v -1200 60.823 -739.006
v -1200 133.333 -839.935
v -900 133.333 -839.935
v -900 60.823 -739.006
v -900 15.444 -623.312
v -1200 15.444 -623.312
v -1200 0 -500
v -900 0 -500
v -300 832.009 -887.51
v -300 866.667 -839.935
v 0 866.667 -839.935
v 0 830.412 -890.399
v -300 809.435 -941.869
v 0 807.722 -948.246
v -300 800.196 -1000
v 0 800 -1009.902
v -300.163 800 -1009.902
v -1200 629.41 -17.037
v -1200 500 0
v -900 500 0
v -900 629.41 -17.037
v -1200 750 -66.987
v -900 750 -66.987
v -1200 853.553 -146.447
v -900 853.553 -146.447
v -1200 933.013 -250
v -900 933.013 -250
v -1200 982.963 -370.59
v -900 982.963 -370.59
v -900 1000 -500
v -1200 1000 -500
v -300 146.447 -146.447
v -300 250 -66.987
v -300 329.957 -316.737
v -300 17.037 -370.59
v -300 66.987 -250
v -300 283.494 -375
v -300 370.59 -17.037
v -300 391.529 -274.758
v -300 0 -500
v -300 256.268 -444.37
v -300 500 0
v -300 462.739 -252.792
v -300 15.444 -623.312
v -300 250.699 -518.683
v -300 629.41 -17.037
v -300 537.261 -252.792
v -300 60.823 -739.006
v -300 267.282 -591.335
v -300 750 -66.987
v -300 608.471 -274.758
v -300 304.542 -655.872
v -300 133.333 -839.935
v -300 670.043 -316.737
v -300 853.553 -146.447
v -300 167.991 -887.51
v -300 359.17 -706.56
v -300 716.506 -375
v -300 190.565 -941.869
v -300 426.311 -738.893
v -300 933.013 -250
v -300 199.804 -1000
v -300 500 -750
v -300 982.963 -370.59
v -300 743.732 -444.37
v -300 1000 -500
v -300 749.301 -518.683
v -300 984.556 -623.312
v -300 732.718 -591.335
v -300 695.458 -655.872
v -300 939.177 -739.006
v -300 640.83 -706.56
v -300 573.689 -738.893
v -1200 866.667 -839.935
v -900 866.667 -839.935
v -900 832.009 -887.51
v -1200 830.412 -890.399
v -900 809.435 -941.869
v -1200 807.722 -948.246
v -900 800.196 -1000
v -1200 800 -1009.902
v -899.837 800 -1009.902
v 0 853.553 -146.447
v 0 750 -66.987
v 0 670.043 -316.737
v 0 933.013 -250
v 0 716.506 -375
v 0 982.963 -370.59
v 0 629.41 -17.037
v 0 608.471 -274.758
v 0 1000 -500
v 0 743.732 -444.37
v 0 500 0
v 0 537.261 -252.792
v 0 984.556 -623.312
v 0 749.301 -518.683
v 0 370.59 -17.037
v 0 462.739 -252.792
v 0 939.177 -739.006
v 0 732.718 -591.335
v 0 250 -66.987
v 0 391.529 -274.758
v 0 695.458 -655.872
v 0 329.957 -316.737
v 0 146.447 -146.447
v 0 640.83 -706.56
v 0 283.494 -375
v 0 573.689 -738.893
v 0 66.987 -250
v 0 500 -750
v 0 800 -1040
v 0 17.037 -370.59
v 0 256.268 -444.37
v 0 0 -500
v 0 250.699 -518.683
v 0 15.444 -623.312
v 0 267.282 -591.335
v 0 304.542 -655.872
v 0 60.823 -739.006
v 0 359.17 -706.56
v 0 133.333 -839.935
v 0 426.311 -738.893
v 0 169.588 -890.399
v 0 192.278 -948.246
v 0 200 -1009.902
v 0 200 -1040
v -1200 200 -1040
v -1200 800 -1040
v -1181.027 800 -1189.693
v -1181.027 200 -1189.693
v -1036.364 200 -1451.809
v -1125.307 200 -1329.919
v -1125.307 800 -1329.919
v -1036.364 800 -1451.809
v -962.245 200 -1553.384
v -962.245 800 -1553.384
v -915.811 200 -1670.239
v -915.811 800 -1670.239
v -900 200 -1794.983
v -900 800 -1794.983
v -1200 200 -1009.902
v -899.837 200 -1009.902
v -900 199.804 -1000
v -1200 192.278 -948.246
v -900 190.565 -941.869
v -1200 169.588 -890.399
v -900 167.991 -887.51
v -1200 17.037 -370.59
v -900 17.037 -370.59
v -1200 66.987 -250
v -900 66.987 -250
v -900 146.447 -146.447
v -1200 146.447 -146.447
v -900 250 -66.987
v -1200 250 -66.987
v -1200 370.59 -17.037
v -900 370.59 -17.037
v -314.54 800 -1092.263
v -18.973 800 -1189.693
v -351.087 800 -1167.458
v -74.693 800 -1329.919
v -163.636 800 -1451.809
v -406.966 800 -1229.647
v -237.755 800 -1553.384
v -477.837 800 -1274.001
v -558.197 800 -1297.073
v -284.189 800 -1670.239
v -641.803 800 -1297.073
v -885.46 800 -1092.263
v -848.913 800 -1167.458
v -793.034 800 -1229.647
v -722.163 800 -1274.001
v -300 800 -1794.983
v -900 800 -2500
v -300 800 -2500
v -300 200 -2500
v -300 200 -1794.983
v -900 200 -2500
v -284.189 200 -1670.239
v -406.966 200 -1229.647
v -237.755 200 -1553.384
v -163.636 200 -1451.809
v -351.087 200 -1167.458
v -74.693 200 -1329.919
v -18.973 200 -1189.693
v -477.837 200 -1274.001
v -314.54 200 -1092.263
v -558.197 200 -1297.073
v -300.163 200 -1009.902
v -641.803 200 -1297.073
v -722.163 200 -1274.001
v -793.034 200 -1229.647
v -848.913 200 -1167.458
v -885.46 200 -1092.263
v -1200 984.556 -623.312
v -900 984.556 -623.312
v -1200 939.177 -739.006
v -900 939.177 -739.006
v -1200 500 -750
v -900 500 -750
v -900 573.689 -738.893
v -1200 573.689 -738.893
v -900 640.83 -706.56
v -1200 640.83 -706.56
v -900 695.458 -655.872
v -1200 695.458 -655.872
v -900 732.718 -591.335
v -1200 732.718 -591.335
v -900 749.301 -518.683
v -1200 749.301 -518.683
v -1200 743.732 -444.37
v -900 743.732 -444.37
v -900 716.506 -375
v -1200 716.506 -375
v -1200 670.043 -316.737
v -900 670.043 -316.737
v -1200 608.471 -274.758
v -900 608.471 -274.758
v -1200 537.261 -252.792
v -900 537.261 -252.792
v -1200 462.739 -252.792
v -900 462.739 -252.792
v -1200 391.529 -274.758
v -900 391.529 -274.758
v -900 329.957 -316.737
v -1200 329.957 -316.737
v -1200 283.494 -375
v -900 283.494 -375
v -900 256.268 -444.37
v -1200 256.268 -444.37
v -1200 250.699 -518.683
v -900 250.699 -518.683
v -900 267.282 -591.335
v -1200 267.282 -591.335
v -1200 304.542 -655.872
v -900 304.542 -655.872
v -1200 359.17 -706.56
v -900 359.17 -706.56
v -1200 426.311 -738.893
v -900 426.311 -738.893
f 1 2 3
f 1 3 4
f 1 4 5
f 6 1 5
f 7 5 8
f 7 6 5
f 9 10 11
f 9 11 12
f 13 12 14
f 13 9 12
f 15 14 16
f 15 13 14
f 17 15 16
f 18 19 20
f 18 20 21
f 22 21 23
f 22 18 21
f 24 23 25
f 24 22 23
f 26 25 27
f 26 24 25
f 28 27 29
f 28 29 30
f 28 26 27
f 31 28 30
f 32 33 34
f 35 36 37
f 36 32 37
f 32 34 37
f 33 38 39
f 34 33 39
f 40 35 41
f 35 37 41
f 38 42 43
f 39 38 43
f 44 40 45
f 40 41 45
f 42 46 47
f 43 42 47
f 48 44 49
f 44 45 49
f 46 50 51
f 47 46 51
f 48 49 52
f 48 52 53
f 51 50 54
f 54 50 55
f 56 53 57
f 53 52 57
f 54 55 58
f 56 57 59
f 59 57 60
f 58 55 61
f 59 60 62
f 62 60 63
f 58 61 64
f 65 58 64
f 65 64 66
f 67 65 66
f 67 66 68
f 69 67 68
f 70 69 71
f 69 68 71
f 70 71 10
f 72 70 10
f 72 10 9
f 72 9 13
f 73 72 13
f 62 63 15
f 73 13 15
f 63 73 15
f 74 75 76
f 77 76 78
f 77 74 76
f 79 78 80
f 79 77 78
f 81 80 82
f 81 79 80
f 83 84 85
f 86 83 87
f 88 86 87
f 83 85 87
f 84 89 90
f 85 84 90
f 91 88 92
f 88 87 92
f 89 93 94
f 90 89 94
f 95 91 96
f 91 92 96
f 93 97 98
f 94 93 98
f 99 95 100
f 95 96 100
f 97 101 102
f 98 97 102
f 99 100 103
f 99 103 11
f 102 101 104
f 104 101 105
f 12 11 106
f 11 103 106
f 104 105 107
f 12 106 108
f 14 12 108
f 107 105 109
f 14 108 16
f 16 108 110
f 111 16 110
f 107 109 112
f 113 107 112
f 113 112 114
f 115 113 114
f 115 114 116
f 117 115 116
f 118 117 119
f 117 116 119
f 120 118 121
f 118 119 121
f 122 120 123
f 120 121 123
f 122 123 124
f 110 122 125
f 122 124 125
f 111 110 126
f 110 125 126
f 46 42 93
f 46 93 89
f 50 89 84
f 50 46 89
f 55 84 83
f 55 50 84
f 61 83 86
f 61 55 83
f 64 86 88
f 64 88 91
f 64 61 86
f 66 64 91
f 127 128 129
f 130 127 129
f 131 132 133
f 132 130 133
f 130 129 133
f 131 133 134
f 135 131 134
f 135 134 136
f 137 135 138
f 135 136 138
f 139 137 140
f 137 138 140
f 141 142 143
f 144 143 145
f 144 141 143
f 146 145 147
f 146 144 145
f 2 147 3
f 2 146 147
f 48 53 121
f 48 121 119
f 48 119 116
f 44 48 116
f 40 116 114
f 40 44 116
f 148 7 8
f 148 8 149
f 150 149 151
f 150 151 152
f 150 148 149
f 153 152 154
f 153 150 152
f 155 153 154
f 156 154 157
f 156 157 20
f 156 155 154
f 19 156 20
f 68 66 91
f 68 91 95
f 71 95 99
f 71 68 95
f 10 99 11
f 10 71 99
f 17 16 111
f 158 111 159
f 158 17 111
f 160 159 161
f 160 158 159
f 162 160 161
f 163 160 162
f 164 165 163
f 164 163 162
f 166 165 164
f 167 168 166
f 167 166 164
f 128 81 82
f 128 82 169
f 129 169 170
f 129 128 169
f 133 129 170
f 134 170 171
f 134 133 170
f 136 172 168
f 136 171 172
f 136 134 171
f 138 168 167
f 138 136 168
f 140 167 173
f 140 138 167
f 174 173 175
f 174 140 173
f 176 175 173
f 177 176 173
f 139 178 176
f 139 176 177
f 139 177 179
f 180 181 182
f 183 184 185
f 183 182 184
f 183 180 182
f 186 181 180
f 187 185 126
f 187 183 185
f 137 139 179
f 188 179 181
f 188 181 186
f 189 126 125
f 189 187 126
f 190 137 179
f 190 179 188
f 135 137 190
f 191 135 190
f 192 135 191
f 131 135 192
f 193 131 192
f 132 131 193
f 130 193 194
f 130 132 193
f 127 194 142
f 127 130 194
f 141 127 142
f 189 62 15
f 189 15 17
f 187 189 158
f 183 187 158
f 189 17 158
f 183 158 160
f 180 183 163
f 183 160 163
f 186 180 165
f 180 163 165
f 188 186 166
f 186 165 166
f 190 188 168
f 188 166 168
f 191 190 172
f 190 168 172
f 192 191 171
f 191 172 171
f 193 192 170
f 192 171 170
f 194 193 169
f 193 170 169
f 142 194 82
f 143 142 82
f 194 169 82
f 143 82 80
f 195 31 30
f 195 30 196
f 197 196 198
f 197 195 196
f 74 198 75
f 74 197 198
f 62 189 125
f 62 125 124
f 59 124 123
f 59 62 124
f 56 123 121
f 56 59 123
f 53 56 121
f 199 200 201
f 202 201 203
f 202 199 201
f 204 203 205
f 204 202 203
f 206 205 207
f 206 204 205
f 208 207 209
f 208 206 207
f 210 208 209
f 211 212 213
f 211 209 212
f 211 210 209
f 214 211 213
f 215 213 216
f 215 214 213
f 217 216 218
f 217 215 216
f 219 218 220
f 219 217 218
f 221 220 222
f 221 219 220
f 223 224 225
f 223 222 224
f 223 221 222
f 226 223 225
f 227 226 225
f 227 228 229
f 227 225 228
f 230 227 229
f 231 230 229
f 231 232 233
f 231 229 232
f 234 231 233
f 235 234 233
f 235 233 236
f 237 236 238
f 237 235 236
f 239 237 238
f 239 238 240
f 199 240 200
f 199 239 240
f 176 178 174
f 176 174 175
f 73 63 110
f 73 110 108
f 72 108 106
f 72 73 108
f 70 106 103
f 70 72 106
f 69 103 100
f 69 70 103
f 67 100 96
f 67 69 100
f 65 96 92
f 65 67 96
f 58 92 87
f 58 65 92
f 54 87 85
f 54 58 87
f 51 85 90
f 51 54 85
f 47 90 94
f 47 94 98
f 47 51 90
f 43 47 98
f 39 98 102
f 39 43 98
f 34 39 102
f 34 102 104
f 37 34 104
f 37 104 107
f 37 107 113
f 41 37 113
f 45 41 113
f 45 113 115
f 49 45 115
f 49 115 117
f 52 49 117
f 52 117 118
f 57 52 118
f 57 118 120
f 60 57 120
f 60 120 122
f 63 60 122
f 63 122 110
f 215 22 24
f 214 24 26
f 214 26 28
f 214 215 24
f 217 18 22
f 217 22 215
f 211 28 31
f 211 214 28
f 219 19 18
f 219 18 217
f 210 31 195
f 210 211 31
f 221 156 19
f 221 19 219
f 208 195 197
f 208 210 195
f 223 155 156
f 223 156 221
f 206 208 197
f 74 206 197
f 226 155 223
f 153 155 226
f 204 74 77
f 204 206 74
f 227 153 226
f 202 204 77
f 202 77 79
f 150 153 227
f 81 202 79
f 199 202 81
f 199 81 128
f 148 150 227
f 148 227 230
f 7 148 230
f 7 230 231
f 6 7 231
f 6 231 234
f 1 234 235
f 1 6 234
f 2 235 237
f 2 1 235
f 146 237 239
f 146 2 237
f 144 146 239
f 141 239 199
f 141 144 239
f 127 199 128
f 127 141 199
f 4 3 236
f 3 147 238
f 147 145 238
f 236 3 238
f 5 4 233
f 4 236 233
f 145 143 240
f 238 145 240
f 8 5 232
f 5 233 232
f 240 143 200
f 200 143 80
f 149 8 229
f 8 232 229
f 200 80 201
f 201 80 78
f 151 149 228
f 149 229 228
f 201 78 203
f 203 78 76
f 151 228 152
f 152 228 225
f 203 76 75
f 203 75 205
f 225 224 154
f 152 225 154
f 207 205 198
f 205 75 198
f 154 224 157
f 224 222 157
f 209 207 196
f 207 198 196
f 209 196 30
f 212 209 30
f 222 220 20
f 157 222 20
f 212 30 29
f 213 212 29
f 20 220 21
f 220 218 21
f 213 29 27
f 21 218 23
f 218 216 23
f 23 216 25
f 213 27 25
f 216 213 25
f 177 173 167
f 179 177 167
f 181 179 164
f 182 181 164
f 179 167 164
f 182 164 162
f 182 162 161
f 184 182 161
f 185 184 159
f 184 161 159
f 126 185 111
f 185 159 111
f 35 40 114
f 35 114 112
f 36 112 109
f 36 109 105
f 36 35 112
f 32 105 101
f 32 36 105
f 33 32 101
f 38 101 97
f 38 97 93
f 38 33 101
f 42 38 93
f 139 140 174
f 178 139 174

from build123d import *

# Parameters (mm, degrees)
SKETCH1_W           = 1200
SKETCH1_H           = 2500
BOSS_EXTRUDE1_DEPTH = 1000
CUT_EXTRUDE1_DEPTH  = 2948.880594597
SKETCH3_R           = 250
CUT_EXTRUDE2_DEPTH  = 2948.880594597


with BuildPart() as part:
    # Sketch1 → Boss-Extrude1 (new body)
    with BuildSketch(Plane(origin=(0, 0, 0), x_dir=(1, 0, 0), z_dir=(0, 1, 0))):
        with Locations((-600, 1250)):
            Rectangle(SKETCH1_W, SKETCH1_H)
    extrude(amount=BOSS_EXTRUDE1_DEPTH)

    # Sketch2 → Cut-Extrude1 (cut, through all)
    with BuildSketch(Plane(origin=(0, 1000, 0), x_dir=(1, 0, 0), z_dir=(0, 1, 0))):
        with BuildLine():
            ThreePointArc((-300, 1000), (-600, 1300), (-900, 1000))
            Line((-900, 1000), (-900, 0))
            Line((-900, 0), (-300, 0))
            Line((-300, 0), (-300, 1000))
        make_face()
        with BuildLine():
            Line((0, 2500), (-300, 2500))
            Line((-300, 2500), (-300, 1794.983443527))
            ThreePointArc((-300, 1794.983443527), (-264.660188642, 1610.346207058), (-163.636363636, 1451.809151015))
            ThreePointArc((-163.636363636, 1451.809151015), (-42.407773629, 1261.564683763), (0, 1040))
            Line((0, 1040), (0, 2500))
        make_face()
        with BuildLine():
            Line((-900, 1794.983443527), (-900, 2500))
            Line((-900, 2500), (-1200, 2500))
            Line((-1200, 2500), (-1200, 1040))
            ThreePointArc((-1200, 1040), (-1157.592226371, 1261.564683763), (-1036.363636364, 1451.809151015))
            ThreePointArc((-1036.363636364, 1451.809151015), (-935.339811358, 1610.346207058), (-900, 1794.983443527))
        make_face()
    extrude(amount=-CUT_EXTRUDE1_DEPTH, mode=Mode.SUBTRACT)

    # Sketch3 → Cut-Extrude2 (cut, through all)
    with BuildSketch(Plane(origin=(0, 0, 0), x_dir=(0, 0, -1), z_dir=(1, 0, 0))):
        with BuildLine():
            Line((2500, 800), (2500, 1000))
            Line((2500, 1000), (499.999999194, 1000))
            ThreePointArc((499.999999194, 1000), (682.57418546, 965.474668273), (839.93463424, 866.666666667))
            ThreePointArc((839.93463424, 866.666666667), (918.614858442, 817.262665937), (1009.901951359, 800))
            Line((1009.901951359, 800), (2500, 800))
        make_face()
        with BuildLine():
            Line((2500, 0), (2500, 200))
            Line((2500, 200), (1009.901951359, 200))
            ThreePointArc((1009.901951359, 200), (918.614858442, 182.737334063), (839.93463424, 133.333333333))
            ThreePointArc((839.93463424, 133.333333333), (682.574185835, 34.525331874), (500, 0))
            Line((500, 0), (2500, 0))
        make_face()
        with BuildLine():
            ThreePointArc((0, 500.000000799), (146.446609404, 853.553390591), (499.999999194, 1000))
            Line((499.999999194, 1000), (0, 1000))
            Line((0, 1000), (0, 500.000000799))
        make_face()
        with BuildLine():
            Line((0, 0), (500, 0))
            ThreePointArc((500, 0), (146.446609124, 146.446609689), (0, 500.000000799))
            Line((0, 500.000000799), (0, 0))
        make_face()
        with Locations((500, 500)):
            Circle(SKETCH3_R)
    extrude(amount=-CUT_EXTRUDE2_DEPTH, mode=Mode.SUBTRACT)


solid = part.part
